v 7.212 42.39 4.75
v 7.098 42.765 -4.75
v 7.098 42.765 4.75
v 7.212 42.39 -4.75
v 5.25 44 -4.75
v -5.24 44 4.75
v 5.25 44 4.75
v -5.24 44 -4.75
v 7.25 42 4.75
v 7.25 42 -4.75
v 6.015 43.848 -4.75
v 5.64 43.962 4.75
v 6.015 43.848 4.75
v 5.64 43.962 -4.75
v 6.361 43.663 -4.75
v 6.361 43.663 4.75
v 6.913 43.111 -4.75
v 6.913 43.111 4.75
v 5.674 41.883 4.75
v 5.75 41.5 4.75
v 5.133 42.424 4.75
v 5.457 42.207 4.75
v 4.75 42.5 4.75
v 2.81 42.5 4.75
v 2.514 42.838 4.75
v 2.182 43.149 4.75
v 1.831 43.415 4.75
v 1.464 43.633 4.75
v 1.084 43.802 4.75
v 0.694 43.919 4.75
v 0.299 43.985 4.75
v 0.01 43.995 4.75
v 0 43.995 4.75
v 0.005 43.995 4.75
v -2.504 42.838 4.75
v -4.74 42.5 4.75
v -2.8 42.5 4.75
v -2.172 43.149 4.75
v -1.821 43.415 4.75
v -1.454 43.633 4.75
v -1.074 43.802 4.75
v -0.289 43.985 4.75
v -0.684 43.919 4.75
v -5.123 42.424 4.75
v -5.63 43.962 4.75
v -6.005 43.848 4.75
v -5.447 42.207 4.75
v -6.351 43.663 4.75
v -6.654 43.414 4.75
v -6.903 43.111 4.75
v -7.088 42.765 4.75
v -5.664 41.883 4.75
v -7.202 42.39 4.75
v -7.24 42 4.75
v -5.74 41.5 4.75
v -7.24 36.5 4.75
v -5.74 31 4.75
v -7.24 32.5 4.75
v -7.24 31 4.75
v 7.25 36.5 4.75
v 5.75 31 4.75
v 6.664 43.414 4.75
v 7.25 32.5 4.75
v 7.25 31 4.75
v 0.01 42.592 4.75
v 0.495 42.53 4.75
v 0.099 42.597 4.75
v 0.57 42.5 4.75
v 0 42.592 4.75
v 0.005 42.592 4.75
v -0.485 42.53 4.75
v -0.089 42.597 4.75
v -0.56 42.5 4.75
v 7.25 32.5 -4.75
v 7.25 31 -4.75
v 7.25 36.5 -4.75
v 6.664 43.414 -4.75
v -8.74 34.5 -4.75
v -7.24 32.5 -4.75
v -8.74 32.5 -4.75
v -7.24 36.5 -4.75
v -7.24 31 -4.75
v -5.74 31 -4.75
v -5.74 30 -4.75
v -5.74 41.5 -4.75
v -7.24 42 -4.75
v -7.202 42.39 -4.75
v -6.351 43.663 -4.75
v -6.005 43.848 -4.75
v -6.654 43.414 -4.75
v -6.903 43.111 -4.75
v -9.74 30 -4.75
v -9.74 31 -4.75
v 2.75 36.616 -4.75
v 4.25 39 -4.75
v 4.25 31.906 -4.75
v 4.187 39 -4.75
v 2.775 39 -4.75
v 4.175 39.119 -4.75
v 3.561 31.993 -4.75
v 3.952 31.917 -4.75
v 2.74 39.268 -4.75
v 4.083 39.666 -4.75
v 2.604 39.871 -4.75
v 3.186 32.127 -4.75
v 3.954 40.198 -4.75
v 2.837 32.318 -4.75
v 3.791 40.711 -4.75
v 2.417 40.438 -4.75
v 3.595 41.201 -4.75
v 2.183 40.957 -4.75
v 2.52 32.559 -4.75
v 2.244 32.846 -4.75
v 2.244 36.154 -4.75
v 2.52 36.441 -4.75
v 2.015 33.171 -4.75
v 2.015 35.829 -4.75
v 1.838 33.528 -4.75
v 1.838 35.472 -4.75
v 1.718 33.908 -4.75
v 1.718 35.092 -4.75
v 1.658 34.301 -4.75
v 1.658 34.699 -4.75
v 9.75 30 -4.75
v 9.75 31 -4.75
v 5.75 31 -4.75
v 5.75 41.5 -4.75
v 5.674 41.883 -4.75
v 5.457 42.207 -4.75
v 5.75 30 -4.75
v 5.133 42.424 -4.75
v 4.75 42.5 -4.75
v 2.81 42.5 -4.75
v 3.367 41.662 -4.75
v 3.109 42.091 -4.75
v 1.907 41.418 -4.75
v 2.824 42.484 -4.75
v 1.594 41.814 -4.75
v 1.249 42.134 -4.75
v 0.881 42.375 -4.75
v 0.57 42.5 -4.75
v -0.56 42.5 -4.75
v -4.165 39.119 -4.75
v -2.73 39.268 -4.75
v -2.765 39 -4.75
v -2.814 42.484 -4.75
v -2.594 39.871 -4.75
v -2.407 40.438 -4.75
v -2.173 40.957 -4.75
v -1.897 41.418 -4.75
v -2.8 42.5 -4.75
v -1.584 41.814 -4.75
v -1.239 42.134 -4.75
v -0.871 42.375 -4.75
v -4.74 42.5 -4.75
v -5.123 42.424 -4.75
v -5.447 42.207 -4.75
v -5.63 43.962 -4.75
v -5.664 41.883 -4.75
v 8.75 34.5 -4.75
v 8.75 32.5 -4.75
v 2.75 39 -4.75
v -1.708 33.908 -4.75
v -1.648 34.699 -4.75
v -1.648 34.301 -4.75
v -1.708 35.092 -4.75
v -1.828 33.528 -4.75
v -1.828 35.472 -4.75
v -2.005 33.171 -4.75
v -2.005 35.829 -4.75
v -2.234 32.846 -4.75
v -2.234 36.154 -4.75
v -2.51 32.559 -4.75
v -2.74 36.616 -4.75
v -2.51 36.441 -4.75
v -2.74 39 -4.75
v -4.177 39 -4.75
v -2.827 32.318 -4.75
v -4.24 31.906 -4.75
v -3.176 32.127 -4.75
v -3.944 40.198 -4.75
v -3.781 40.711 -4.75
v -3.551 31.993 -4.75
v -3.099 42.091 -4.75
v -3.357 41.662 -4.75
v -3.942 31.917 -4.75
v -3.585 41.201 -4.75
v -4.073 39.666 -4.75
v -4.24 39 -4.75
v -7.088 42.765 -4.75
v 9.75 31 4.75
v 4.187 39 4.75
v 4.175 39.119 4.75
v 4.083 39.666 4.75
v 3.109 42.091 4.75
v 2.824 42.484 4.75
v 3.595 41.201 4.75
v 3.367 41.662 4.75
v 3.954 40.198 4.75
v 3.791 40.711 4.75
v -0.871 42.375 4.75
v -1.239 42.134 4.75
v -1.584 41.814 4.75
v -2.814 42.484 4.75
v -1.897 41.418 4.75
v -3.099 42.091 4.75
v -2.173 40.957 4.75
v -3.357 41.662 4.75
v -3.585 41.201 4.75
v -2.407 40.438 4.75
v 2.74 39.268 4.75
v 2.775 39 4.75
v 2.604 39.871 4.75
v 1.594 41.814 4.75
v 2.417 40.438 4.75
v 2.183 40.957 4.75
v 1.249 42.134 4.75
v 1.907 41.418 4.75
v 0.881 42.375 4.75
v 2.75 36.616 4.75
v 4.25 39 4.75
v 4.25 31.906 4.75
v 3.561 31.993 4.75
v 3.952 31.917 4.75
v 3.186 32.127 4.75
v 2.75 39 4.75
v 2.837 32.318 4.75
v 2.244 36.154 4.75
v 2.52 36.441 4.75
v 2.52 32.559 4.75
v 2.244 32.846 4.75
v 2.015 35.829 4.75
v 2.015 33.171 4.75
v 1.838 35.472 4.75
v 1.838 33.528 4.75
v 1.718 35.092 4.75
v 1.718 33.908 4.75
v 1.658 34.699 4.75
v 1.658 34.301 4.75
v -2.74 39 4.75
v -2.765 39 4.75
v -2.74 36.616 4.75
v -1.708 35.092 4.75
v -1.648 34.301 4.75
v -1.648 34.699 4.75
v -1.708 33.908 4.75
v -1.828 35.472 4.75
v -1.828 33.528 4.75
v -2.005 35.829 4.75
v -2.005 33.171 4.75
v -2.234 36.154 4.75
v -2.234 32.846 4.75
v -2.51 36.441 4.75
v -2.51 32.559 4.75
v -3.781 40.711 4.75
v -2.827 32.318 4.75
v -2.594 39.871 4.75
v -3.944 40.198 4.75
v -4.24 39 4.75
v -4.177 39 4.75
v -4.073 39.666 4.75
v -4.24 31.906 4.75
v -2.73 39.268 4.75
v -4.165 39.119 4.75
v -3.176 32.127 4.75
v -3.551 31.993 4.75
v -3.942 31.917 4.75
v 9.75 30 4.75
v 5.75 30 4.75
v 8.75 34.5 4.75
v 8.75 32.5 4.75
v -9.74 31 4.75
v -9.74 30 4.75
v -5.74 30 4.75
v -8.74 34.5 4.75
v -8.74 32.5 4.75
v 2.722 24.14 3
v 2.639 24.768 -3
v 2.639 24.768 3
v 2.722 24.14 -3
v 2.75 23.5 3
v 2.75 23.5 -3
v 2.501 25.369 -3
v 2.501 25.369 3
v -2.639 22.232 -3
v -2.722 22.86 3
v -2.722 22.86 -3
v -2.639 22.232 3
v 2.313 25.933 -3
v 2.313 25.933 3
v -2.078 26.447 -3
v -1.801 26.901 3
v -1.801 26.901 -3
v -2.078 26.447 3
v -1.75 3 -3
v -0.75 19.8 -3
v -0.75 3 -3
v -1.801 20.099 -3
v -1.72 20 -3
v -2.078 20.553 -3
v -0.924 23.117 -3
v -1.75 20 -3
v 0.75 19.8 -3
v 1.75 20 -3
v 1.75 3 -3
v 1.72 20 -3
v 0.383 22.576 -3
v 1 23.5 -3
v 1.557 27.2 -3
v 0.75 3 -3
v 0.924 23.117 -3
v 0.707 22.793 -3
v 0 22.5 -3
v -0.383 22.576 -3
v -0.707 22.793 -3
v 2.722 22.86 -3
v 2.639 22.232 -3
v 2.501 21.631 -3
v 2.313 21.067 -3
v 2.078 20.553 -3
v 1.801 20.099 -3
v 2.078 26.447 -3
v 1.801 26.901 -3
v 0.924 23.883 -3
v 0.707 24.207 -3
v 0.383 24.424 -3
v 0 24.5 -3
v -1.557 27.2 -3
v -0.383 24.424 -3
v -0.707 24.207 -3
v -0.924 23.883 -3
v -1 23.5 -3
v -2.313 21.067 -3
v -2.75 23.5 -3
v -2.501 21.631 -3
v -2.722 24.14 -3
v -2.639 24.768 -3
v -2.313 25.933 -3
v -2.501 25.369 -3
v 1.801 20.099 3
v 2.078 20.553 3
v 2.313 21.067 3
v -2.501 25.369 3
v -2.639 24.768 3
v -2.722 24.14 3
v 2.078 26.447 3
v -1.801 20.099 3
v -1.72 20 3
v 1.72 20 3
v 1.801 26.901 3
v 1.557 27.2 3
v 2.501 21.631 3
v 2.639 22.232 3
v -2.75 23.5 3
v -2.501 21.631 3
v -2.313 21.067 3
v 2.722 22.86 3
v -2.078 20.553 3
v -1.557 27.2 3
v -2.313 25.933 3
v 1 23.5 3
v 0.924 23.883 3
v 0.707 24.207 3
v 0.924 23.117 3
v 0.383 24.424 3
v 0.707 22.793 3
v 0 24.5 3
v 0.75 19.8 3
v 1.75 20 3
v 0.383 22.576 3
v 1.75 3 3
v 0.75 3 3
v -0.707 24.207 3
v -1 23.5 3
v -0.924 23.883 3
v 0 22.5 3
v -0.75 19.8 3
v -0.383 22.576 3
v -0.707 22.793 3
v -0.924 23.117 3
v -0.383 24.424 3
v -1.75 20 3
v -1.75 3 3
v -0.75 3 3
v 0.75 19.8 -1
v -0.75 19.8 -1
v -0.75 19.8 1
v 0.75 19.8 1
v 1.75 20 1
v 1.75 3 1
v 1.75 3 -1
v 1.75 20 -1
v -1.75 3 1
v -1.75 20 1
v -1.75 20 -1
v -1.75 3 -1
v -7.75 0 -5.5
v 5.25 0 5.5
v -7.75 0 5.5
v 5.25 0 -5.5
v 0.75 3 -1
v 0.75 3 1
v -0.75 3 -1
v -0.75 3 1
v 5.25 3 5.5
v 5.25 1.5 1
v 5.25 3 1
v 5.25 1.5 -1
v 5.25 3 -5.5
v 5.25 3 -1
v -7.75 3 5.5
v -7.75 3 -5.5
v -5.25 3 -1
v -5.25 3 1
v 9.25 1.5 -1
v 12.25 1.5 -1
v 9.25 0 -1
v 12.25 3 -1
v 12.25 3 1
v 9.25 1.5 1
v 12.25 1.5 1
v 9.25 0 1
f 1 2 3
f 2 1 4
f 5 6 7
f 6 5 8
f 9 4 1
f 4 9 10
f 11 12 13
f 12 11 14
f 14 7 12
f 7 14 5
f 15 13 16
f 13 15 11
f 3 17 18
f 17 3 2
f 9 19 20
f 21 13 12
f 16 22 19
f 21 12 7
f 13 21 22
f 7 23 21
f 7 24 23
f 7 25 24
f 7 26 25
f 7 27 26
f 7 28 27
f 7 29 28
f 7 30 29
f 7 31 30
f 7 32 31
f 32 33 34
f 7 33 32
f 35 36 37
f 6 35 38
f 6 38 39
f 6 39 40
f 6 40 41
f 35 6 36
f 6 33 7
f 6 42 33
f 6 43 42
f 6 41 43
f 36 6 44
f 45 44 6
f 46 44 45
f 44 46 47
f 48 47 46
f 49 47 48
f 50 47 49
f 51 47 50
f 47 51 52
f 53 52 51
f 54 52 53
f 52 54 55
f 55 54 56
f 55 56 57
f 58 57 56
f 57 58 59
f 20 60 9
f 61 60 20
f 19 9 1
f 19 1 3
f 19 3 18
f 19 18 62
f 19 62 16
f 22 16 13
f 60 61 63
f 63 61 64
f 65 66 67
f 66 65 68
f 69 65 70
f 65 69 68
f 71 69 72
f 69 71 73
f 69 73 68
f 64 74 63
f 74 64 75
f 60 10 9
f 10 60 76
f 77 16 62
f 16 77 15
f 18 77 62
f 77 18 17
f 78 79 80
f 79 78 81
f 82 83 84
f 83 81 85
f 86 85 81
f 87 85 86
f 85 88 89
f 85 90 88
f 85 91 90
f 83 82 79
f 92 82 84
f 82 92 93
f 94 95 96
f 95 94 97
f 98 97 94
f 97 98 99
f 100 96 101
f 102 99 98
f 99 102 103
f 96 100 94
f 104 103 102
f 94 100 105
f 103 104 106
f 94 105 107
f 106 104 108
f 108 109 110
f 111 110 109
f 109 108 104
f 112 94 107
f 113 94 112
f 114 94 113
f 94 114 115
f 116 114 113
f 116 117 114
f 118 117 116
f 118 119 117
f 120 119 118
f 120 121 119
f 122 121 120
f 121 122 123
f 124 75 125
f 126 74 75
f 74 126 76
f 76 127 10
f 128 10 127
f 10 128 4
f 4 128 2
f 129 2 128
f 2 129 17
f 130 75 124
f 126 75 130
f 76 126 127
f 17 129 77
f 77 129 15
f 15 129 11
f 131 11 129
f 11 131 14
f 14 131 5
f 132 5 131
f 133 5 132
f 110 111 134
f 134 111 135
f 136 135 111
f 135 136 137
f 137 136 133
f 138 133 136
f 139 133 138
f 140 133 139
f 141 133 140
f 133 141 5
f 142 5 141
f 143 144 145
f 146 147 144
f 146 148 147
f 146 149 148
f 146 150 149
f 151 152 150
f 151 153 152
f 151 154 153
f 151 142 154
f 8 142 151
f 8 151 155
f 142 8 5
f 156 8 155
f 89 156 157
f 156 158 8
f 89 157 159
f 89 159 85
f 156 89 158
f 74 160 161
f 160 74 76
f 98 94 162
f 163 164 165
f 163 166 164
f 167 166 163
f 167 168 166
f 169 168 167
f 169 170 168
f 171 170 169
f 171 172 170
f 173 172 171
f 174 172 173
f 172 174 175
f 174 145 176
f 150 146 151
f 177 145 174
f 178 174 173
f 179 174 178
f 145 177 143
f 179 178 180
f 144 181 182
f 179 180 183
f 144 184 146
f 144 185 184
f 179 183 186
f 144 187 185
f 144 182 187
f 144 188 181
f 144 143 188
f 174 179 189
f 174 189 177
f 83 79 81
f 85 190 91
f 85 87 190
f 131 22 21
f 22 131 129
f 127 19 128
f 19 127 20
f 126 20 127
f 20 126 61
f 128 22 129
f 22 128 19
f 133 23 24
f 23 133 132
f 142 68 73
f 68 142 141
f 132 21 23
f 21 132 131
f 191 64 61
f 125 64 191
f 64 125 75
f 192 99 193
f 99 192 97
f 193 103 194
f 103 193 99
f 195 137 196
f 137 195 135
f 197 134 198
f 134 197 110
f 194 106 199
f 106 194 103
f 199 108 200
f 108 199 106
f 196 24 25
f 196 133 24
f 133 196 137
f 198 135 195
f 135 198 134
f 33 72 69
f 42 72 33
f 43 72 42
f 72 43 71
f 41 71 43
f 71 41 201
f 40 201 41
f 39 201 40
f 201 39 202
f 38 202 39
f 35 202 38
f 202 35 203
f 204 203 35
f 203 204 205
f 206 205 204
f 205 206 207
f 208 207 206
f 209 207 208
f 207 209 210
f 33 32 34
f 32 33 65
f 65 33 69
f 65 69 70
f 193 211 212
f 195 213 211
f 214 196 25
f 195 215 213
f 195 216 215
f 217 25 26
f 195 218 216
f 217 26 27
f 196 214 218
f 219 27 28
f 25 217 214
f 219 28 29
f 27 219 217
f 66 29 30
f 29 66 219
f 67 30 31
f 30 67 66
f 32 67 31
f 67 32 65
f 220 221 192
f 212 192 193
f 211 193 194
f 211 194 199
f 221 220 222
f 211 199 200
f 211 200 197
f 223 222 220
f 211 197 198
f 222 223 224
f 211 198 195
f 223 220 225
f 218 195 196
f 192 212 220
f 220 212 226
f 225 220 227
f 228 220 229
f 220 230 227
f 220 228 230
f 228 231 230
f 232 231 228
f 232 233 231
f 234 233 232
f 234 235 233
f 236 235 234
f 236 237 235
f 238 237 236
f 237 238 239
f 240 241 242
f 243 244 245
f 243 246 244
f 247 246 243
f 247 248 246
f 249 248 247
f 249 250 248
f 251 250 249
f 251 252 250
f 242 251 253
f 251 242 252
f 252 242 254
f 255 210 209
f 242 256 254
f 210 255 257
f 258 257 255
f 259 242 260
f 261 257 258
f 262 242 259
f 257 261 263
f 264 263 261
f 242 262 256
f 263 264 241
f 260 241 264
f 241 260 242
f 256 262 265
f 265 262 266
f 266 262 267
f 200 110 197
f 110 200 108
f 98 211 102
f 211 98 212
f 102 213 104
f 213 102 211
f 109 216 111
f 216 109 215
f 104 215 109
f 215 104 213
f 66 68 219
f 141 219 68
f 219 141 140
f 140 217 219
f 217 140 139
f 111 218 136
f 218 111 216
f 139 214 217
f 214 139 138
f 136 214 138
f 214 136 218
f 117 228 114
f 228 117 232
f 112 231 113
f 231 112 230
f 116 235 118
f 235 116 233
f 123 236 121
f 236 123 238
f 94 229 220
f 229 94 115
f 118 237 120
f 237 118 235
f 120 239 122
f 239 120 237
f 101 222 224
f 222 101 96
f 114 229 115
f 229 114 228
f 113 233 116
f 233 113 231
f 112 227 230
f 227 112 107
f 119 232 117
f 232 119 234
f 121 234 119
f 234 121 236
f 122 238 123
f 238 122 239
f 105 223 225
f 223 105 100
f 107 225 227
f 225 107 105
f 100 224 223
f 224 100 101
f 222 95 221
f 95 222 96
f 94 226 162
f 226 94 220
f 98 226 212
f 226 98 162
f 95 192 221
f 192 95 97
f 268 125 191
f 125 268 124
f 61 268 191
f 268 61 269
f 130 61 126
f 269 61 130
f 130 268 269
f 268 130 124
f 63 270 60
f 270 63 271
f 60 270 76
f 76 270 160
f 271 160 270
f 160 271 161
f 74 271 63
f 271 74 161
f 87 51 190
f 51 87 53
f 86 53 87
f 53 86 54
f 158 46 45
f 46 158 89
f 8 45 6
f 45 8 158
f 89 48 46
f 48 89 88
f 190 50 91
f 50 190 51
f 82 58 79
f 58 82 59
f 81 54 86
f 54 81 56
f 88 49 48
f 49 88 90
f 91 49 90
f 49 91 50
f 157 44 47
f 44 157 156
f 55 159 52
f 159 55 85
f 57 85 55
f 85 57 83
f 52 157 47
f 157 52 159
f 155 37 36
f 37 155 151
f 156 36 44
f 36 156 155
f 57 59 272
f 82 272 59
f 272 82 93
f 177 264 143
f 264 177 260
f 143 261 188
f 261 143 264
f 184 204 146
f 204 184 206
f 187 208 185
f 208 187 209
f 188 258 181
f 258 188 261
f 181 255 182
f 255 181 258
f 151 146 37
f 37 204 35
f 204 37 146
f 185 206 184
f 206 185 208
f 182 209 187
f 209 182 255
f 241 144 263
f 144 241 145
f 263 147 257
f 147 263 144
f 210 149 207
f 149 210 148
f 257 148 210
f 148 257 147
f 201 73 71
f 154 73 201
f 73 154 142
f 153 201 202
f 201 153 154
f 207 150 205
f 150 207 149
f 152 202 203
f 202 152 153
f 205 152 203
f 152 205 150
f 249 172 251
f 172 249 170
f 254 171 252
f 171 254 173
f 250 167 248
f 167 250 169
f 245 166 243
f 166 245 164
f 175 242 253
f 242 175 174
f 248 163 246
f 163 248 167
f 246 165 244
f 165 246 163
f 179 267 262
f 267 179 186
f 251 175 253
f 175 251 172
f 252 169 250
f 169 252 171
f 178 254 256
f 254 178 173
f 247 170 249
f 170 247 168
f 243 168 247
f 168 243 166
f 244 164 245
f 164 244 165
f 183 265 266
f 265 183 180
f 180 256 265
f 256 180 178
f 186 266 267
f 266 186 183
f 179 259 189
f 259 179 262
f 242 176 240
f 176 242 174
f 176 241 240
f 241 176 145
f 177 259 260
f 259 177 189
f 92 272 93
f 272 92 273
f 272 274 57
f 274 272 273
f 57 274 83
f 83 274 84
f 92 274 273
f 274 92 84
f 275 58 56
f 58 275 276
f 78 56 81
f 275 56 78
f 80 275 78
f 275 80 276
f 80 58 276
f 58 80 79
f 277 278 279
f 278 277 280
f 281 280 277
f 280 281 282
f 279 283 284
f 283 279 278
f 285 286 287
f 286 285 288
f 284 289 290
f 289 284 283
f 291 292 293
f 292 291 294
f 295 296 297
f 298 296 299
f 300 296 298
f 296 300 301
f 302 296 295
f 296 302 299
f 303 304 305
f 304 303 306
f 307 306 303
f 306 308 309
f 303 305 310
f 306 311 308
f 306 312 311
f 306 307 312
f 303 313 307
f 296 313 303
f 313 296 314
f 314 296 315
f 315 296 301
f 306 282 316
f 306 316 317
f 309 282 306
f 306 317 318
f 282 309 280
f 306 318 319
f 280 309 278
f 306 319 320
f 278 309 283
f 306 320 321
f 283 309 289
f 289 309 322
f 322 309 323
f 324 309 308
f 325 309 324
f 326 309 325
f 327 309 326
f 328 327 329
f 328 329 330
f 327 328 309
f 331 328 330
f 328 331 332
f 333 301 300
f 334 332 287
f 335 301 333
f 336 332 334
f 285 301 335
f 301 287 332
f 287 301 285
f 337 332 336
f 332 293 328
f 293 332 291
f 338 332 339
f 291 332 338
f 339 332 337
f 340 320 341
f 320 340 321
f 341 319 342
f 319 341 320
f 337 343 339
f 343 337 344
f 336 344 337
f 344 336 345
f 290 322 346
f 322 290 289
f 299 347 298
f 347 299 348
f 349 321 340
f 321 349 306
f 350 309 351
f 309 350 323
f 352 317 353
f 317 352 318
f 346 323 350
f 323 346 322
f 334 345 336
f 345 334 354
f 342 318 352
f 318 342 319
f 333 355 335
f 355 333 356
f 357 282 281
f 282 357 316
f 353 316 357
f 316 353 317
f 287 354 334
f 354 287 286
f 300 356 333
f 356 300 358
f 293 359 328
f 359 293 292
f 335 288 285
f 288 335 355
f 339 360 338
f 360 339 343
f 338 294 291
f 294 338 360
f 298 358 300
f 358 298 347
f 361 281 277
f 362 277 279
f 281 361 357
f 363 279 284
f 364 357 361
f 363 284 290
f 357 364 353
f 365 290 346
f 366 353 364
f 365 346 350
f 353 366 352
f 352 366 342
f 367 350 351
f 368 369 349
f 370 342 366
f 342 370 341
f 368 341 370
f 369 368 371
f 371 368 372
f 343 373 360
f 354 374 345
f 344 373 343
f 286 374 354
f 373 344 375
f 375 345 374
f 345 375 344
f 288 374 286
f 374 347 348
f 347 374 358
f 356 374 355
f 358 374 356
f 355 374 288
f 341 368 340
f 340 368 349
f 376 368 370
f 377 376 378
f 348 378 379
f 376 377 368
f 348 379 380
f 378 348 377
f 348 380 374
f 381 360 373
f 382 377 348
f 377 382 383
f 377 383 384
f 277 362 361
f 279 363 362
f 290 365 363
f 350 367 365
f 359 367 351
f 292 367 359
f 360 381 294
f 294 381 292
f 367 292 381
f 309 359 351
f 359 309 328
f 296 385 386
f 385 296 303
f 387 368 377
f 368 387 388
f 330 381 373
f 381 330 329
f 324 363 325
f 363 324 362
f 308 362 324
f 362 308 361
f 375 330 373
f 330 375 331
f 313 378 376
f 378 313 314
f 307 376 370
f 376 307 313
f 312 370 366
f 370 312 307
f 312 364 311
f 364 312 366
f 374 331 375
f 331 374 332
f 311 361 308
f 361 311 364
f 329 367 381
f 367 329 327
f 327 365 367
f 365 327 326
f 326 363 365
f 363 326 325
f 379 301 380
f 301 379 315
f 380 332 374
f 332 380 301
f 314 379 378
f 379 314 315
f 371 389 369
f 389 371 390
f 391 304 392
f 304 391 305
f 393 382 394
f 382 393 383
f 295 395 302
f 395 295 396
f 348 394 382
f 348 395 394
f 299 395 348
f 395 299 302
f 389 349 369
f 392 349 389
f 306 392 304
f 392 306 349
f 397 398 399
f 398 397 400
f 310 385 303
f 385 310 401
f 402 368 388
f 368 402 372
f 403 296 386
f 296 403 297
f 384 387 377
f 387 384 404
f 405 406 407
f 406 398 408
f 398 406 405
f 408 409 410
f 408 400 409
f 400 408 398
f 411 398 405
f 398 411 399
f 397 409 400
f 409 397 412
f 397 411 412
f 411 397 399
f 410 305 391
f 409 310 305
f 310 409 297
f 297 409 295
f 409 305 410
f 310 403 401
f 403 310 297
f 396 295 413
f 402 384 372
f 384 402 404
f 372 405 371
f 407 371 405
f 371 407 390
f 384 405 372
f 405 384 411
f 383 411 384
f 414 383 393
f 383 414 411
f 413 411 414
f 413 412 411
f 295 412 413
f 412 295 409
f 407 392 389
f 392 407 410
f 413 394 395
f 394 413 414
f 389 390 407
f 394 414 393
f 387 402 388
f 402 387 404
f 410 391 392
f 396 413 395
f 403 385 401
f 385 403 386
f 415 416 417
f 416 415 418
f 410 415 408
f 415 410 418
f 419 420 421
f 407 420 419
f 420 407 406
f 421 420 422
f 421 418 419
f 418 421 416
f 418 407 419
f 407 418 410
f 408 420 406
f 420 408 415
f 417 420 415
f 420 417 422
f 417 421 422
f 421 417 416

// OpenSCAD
PC_THICK=1.5;
PC_W=14.5;
PC_D=9.5;
PC_H=13;

PLAY=0.1;

PLUG_H=13;
PLUG_R=2;
PLUG_THICK=1.5;

BAR_W=4;
BAR_H=1;

OVAL_W=5.5;
OVAL_H=9;
OVAL_D=6;
OVAL_CHOP=0.8;
HOLE_R=1;

FOOT_W=13;
FOOT_H=3;
FOOT_D=11;
FOOT_SHIFT=2.5;

LEG_W=3.5;
LEG_H=20;
LEG_HOLE_W=1.5;

PLUG_PIN_DELTA=15;

WING_W=FOOT_W-FOOT_SHIFT;
WING_D=2;

CLIP_W=7;

PRINT="both"; // [pin, plug, both]

/* [Render Options] */
render_fs=.4;
render_fn=0;
render_fa=.4;

// Set Render Options
$fs= ($preview) ? $fs : render_fs;
$fn= ($preview) ? 16 : render_fn;
$fa= ($preview) ? $fa : render_fa;

module plug_body(r,d) {
    translate([0,0,-d/2])
    minkowski() {
        cube([PC_W-r, PLUG_H-r, PC_D+d-.01]);
        cylinder(r=r, h=0.01);
    }

}

module plug_edge() {
    translate([-PC_W/2,-PC_W+PC_THICK+PC_H,0])
    difference() {
        plug_body(PLUG_R,0);
        translate([-PLUG_THICK,-PLUG_THICK,0])
            plug_body(PLUG_R-1,1);
        translate([0,-100,-50])
            cube([100,100,100]);
    }
}

module plug_side() {
    translate([0,BAR_H,-PC_D/2])
    difference() {
        union() {
            plug_edge();
            bar();
            clip1();
            oval_edge();
        }
        translate([-100,-50,-50])
            cube([100,100,100]);
    }
}

module bar() {
    translate([PC_W/2-PLUG_THICK,-1,0])
        cube([BAR_W,BAR_H,PC_D]);
}

module clip1() {
    translate([PC_W/2,PC_THICK,0])
    linear_extrude(height=PC_D)
    polygon(points=[[0,0],[1.5,0],[1.5,2],[0,4]]);
}

module oval_shape(d,d2) {
    translate([0,0,-d2/2])
    scale([1,(OVAL_H+2*d)/(OVAL_W+2*d),1])
        cylinder(r=(OVAL_W+2*d)/2,h=PC_D+d2);
}

module oval() {
    translate([0,-OVAL_H/2+PLUG_H,0])
    difference() {
    	translate([0,0,-OVAL_D/2]) intersection() {
            oval_shape(0,0);
            cube([OVAL_W,OVAL_H-2*OVAL_CHOP,2*OVAL_D], center=true);
        }
        cylinder(r=HOLE_R,h=OVAL_D+.01, center=true);
    }
}

module oval_edge() {
    translate([0,-OVAL_H/2+PLUG_H-PLUG_THICK,0]) {
        intersection() {
            difference() {
                oval_shape(PLUG_THICK,0);
                oval_shape(PLAY,0.1);
            }
            translate([-50,0,0])
            cube([100,100,100]);
        }
    }
    translate([OVAL_W/2+PLUG_THICK,PLUG_H-PLUG_THICK-OVAL_H+1,0]) {
        intersection() {
            cylinder(r=2.6, h=PC_D);
            translate([-100,-50,0])
                cube([100,100,100]);
        }
        translate([-PLUG_THICK,0,0])
            cube([PLUG_THICK,4.5,PC_D]);
    }
}

module plug() {
    plug_side();
    translate([0.01,0,0])
    mirror([1,0,0])
        plug_side();
}

module pin() {
    translate([-FOOT_W/2-FOOT_SHIFT/2,0,-FOOT_D/2])
        cube([FOOT_W,FOOT_H,FOOT_D]);
    
    translate([0,PLUG_PIN_DELTA,0])
        oval();
    
    difference() {
        translate([0,LEG_H/2,0])
            cube([LEG_W,LEG_H,OVAL_D],center=true);
        translate([0,LEG_H/2, 0])
            cube([LEG_HOLE_W,LEG_H,OVAL_D+.02],center=true);
    }

    translate([0,0,-WING_D/2])
        linear_extrude(height=WING_D)
        polygon(points=[[-WING_W/2,FOOT_H],[WING_W/2,FOOT_H],[LEG_W/2,LEG_H],[-LEG_W/2,LEG_H]]);

    translate([FOOT_W/2-FOOT_SHIFT/2,0,-WING_D/2])
    linear_extrude(height=WING_D)
    polygon(points=[[0,FOOT_H/2],[0,FOOT_H],[CLIP_W,FOOT_H],[CLIP_W,FOOT_H/2],[CLIP_W-FOOT_H,0],[CLIP_W-FOOT_H,FOOT_H/2]]);
}

if (PRINT == "both") translate([0,PLUG_PIN_DELTA*2,0]) plug();
if (PRINT == "plug") plug();
if (PRINT == "pin" || PRINT == "both") pin();
